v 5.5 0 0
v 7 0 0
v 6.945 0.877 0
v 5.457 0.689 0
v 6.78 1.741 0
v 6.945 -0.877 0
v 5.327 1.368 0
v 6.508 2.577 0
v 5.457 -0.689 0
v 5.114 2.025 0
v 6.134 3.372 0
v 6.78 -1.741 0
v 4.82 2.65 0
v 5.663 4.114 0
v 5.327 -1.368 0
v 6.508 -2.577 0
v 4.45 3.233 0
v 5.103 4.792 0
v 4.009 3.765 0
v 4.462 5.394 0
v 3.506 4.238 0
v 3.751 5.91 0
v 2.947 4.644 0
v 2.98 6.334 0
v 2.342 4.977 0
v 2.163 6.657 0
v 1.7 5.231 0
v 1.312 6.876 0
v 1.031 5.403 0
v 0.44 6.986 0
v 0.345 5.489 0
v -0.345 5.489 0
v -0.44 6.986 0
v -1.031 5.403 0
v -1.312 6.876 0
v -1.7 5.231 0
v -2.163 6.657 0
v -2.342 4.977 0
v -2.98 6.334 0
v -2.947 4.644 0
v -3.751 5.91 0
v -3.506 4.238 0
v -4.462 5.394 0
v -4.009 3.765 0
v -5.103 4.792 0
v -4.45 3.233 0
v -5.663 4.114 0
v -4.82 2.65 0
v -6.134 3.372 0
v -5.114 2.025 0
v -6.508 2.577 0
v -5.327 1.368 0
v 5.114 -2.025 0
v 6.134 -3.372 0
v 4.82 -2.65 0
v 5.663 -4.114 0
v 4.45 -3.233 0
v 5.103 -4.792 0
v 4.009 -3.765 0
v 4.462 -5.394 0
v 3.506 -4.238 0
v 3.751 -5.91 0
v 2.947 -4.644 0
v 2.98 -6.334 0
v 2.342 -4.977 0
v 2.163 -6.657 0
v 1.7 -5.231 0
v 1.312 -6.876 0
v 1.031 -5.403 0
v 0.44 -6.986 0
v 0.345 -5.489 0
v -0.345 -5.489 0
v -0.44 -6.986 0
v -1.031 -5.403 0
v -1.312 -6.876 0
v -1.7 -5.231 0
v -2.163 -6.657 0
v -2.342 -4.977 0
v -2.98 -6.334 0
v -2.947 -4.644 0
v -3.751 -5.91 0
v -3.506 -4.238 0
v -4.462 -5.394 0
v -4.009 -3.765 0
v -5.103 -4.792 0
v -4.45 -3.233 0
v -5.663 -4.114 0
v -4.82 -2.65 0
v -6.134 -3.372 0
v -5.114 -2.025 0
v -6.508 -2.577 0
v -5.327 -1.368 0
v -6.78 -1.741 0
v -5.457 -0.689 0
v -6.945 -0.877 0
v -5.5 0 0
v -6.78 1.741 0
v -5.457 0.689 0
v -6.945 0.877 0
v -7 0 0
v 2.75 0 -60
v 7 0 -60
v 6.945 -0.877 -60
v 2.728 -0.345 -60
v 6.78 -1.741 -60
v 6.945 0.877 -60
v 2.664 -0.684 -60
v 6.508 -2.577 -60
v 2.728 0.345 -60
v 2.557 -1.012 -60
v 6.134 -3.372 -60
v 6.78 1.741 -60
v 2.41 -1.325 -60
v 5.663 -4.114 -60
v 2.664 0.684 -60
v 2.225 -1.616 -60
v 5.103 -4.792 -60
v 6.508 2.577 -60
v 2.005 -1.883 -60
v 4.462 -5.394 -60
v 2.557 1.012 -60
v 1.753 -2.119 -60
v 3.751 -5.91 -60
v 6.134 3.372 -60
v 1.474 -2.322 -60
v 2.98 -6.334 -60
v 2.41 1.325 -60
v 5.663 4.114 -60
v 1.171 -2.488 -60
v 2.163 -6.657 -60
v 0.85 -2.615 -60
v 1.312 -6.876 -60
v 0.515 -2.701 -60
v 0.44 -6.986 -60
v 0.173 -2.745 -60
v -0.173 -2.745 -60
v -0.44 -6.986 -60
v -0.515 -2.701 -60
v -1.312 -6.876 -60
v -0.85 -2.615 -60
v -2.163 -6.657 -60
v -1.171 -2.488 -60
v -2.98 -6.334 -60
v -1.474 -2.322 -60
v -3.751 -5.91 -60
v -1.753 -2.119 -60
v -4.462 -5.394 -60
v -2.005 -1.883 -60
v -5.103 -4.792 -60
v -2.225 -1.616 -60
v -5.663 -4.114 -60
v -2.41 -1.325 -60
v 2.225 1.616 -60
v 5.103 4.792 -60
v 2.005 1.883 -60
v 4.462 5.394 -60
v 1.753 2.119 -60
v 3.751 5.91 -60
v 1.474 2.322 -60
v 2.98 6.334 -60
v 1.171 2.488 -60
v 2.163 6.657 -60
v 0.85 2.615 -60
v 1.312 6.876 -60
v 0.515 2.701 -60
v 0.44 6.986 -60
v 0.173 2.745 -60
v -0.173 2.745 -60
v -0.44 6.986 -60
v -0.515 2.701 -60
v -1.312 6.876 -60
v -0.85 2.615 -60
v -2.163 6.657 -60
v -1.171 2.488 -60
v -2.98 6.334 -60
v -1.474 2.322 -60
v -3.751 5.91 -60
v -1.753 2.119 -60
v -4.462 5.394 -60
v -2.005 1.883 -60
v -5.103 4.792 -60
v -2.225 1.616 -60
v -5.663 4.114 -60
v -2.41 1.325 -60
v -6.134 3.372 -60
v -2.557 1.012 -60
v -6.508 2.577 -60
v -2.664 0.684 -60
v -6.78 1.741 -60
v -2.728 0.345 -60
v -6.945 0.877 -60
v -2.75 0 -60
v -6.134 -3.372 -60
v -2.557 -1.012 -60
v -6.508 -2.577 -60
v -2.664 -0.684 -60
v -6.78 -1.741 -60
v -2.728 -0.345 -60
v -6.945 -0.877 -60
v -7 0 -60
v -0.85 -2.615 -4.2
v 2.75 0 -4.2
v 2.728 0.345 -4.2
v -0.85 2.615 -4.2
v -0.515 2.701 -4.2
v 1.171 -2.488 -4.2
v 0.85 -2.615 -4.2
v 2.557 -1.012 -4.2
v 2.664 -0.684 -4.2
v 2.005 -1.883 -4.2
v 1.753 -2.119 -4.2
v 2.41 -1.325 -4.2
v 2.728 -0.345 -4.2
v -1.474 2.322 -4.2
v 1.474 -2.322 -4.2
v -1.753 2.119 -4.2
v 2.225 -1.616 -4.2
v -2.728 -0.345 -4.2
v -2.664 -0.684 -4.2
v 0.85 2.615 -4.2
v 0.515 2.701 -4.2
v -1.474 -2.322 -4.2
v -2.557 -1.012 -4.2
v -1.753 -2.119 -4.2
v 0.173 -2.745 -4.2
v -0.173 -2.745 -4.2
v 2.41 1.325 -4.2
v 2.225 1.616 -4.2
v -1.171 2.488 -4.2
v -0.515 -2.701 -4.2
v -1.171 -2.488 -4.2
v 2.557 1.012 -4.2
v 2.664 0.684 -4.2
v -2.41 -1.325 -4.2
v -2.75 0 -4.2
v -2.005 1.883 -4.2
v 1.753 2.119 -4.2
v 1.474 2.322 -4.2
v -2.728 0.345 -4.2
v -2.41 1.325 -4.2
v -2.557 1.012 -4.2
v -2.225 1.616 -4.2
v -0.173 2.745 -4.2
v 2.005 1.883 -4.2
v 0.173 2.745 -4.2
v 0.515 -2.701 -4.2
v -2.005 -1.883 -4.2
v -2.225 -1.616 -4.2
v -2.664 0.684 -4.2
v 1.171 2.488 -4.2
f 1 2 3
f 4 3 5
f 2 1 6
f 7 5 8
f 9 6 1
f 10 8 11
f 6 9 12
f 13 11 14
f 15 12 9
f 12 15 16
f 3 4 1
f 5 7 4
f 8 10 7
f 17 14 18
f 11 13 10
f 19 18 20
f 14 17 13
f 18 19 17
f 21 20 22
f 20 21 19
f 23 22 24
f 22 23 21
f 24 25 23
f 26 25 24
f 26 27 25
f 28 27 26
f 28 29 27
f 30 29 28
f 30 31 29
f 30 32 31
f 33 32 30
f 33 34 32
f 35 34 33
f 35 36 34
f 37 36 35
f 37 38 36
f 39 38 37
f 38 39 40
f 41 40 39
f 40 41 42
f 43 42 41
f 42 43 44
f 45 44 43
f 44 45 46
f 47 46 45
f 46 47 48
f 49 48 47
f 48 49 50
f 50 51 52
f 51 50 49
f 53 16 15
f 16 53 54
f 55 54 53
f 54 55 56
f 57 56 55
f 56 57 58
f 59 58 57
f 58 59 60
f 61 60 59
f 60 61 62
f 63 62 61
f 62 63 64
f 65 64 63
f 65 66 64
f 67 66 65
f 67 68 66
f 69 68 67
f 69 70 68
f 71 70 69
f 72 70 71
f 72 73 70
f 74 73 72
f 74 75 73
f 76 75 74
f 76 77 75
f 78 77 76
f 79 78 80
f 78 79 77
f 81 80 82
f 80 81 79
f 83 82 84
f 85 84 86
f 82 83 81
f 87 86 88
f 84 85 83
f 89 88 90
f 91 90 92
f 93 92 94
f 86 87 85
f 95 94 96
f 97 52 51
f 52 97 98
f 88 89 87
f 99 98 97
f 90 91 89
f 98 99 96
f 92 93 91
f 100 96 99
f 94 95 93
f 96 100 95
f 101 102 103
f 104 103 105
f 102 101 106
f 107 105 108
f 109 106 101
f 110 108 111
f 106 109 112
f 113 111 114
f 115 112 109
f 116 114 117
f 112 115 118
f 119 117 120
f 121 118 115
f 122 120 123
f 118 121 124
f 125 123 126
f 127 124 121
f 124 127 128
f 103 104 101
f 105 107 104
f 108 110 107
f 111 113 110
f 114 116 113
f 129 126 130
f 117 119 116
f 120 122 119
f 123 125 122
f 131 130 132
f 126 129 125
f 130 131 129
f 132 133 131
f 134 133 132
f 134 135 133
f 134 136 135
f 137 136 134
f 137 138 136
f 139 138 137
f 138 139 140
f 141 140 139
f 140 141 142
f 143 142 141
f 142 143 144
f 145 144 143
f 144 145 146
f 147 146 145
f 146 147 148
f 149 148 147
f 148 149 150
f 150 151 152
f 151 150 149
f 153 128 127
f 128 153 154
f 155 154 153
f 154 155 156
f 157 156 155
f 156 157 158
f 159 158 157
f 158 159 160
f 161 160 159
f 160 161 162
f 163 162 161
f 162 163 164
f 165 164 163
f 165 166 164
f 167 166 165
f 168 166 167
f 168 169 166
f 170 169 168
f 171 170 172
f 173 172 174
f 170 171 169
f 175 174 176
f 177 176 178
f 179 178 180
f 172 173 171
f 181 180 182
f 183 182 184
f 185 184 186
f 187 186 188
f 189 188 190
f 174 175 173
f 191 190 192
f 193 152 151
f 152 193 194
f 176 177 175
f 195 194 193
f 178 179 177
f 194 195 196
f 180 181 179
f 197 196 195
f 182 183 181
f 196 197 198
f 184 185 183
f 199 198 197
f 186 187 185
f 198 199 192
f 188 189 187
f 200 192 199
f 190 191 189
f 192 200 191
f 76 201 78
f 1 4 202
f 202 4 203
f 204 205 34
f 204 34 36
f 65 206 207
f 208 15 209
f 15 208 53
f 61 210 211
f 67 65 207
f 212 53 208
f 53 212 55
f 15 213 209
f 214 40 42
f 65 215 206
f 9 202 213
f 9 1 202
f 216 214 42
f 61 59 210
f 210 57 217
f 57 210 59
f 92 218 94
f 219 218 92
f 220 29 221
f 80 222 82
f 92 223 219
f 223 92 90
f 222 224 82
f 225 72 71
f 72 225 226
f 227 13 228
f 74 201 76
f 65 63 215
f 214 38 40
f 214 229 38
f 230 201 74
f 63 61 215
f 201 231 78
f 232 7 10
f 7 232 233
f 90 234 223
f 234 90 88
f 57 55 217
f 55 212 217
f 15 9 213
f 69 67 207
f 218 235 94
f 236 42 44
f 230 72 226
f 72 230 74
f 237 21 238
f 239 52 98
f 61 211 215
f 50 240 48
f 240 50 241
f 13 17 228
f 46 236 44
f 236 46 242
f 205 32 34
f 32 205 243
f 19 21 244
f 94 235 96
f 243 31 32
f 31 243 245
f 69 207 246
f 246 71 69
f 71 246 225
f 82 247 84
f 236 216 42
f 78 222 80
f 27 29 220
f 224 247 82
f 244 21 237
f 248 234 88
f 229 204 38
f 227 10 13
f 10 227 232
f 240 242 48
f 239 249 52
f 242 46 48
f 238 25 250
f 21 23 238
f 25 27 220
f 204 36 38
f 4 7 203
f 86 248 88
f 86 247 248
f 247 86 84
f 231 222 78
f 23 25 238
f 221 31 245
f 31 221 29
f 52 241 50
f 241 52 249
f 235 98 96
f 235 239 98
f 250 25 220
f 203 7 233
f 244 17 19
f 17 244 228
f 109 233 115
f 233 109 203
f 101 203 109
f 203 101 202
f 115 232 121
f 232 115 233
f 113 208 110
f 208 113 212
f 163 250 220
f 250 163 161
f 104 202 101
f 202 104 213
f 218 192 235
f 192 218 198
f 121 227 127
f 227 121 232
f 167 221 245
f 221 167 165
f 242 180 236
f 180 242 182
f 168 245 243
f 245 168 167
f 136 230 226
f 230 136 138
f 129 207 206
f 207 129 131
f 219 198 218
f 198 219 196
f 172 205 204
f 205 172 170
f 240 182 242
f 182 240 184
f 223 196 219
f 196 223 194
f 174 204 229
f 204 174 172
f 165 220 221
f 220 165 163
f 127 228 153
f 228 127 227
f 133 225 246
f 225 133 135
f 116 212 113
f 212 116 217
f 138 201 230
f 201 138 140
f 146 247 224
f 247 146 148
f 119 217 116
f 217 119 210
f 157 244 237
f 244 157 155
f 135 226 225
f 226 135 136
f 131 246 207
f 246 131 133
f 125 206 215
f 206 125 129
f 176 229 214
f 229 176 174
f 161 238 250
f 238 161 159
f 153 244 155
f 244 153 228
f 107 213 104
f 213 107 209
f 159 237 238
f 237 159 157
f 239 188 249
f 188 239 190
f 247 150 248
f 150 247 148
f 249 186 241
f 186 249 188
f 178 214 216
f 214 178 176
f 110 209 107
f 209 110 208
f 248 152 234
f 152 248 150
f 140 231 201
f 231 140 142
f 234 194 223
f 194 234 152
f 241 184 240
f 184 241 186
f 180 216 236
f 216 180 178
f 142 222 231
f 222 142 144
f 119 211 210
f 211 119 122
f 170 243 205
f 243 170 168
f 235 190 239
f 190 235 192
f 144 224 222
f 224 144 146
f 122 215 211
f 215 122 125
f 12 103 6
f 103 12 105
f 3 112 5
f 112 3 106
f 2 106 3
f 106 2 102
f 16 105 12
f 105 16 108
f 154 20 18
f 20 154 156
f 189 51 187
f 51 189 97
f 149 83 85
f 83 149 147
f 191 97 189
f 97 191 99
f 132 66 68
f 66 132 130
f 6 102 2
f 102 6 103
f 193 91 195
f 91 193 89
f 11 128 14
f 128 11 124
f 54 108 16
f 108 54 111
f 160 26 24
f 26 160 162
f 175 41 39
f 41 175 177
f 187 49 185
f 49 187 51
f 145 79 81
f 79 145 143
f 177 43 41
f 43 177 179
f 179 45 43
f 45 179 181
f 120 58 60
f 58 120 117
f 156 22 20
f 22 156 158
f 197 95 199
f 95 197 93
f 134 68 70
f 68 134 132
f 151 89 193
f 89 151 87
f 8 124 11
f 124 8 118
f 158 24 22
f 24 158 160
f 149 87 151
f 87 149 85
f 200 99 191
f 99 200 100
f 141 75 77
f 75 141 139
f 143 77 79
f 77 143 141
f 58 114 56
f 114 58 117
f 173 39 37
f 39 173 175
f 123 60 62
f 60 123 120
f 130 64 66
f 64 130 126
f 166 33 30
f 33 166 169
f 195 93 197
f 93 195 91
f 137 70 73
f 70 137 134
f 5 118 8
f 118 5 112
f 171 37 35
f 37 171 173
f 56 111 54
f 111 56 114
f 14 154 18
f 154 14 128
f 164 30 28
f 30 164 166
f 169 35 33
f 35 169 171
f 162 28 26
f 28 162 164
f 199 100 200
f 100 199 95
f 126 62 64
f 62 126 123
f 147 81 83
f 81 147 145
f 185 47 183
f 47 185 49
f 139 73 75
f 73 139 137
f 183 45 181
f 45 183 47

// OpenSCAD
$fn = 50;


difference() {
	union() {
		translate(v = [0, 0, -60.0000000000]) {
			cylinder(h = 60, r = 7.0000000000);
		}
		cylinder(h = 0, r = 13.0000000000);
	}
	union() {
		translate(v = [0, 0, 0]) {
			rotate(a = [0, 0, 0]) {
				difference() {
					union() {
						#translate(v = [0, 0, -60.0000000000]) {
							cylinder(h = 60, r = 2.2500000000);
						}
						#translate(v = [0, 0, -4.2000000000]) {
							cylinder(h = 4.2000000000, r = 7.0000000000, r1 = 2.7500000000, r2 = 5.5000000000);
						}
						#translate(v = [0, 0, -60.0000000000]) {
							cylinder(h = 60, r = 2.7500000000);
						}
						#translate(v = [0, 0, -60.0000000000]) {
							cylinder(h = 60, r = 2.2500000000);
						}
					}
					union();
				}
			}
		}
	}
}
